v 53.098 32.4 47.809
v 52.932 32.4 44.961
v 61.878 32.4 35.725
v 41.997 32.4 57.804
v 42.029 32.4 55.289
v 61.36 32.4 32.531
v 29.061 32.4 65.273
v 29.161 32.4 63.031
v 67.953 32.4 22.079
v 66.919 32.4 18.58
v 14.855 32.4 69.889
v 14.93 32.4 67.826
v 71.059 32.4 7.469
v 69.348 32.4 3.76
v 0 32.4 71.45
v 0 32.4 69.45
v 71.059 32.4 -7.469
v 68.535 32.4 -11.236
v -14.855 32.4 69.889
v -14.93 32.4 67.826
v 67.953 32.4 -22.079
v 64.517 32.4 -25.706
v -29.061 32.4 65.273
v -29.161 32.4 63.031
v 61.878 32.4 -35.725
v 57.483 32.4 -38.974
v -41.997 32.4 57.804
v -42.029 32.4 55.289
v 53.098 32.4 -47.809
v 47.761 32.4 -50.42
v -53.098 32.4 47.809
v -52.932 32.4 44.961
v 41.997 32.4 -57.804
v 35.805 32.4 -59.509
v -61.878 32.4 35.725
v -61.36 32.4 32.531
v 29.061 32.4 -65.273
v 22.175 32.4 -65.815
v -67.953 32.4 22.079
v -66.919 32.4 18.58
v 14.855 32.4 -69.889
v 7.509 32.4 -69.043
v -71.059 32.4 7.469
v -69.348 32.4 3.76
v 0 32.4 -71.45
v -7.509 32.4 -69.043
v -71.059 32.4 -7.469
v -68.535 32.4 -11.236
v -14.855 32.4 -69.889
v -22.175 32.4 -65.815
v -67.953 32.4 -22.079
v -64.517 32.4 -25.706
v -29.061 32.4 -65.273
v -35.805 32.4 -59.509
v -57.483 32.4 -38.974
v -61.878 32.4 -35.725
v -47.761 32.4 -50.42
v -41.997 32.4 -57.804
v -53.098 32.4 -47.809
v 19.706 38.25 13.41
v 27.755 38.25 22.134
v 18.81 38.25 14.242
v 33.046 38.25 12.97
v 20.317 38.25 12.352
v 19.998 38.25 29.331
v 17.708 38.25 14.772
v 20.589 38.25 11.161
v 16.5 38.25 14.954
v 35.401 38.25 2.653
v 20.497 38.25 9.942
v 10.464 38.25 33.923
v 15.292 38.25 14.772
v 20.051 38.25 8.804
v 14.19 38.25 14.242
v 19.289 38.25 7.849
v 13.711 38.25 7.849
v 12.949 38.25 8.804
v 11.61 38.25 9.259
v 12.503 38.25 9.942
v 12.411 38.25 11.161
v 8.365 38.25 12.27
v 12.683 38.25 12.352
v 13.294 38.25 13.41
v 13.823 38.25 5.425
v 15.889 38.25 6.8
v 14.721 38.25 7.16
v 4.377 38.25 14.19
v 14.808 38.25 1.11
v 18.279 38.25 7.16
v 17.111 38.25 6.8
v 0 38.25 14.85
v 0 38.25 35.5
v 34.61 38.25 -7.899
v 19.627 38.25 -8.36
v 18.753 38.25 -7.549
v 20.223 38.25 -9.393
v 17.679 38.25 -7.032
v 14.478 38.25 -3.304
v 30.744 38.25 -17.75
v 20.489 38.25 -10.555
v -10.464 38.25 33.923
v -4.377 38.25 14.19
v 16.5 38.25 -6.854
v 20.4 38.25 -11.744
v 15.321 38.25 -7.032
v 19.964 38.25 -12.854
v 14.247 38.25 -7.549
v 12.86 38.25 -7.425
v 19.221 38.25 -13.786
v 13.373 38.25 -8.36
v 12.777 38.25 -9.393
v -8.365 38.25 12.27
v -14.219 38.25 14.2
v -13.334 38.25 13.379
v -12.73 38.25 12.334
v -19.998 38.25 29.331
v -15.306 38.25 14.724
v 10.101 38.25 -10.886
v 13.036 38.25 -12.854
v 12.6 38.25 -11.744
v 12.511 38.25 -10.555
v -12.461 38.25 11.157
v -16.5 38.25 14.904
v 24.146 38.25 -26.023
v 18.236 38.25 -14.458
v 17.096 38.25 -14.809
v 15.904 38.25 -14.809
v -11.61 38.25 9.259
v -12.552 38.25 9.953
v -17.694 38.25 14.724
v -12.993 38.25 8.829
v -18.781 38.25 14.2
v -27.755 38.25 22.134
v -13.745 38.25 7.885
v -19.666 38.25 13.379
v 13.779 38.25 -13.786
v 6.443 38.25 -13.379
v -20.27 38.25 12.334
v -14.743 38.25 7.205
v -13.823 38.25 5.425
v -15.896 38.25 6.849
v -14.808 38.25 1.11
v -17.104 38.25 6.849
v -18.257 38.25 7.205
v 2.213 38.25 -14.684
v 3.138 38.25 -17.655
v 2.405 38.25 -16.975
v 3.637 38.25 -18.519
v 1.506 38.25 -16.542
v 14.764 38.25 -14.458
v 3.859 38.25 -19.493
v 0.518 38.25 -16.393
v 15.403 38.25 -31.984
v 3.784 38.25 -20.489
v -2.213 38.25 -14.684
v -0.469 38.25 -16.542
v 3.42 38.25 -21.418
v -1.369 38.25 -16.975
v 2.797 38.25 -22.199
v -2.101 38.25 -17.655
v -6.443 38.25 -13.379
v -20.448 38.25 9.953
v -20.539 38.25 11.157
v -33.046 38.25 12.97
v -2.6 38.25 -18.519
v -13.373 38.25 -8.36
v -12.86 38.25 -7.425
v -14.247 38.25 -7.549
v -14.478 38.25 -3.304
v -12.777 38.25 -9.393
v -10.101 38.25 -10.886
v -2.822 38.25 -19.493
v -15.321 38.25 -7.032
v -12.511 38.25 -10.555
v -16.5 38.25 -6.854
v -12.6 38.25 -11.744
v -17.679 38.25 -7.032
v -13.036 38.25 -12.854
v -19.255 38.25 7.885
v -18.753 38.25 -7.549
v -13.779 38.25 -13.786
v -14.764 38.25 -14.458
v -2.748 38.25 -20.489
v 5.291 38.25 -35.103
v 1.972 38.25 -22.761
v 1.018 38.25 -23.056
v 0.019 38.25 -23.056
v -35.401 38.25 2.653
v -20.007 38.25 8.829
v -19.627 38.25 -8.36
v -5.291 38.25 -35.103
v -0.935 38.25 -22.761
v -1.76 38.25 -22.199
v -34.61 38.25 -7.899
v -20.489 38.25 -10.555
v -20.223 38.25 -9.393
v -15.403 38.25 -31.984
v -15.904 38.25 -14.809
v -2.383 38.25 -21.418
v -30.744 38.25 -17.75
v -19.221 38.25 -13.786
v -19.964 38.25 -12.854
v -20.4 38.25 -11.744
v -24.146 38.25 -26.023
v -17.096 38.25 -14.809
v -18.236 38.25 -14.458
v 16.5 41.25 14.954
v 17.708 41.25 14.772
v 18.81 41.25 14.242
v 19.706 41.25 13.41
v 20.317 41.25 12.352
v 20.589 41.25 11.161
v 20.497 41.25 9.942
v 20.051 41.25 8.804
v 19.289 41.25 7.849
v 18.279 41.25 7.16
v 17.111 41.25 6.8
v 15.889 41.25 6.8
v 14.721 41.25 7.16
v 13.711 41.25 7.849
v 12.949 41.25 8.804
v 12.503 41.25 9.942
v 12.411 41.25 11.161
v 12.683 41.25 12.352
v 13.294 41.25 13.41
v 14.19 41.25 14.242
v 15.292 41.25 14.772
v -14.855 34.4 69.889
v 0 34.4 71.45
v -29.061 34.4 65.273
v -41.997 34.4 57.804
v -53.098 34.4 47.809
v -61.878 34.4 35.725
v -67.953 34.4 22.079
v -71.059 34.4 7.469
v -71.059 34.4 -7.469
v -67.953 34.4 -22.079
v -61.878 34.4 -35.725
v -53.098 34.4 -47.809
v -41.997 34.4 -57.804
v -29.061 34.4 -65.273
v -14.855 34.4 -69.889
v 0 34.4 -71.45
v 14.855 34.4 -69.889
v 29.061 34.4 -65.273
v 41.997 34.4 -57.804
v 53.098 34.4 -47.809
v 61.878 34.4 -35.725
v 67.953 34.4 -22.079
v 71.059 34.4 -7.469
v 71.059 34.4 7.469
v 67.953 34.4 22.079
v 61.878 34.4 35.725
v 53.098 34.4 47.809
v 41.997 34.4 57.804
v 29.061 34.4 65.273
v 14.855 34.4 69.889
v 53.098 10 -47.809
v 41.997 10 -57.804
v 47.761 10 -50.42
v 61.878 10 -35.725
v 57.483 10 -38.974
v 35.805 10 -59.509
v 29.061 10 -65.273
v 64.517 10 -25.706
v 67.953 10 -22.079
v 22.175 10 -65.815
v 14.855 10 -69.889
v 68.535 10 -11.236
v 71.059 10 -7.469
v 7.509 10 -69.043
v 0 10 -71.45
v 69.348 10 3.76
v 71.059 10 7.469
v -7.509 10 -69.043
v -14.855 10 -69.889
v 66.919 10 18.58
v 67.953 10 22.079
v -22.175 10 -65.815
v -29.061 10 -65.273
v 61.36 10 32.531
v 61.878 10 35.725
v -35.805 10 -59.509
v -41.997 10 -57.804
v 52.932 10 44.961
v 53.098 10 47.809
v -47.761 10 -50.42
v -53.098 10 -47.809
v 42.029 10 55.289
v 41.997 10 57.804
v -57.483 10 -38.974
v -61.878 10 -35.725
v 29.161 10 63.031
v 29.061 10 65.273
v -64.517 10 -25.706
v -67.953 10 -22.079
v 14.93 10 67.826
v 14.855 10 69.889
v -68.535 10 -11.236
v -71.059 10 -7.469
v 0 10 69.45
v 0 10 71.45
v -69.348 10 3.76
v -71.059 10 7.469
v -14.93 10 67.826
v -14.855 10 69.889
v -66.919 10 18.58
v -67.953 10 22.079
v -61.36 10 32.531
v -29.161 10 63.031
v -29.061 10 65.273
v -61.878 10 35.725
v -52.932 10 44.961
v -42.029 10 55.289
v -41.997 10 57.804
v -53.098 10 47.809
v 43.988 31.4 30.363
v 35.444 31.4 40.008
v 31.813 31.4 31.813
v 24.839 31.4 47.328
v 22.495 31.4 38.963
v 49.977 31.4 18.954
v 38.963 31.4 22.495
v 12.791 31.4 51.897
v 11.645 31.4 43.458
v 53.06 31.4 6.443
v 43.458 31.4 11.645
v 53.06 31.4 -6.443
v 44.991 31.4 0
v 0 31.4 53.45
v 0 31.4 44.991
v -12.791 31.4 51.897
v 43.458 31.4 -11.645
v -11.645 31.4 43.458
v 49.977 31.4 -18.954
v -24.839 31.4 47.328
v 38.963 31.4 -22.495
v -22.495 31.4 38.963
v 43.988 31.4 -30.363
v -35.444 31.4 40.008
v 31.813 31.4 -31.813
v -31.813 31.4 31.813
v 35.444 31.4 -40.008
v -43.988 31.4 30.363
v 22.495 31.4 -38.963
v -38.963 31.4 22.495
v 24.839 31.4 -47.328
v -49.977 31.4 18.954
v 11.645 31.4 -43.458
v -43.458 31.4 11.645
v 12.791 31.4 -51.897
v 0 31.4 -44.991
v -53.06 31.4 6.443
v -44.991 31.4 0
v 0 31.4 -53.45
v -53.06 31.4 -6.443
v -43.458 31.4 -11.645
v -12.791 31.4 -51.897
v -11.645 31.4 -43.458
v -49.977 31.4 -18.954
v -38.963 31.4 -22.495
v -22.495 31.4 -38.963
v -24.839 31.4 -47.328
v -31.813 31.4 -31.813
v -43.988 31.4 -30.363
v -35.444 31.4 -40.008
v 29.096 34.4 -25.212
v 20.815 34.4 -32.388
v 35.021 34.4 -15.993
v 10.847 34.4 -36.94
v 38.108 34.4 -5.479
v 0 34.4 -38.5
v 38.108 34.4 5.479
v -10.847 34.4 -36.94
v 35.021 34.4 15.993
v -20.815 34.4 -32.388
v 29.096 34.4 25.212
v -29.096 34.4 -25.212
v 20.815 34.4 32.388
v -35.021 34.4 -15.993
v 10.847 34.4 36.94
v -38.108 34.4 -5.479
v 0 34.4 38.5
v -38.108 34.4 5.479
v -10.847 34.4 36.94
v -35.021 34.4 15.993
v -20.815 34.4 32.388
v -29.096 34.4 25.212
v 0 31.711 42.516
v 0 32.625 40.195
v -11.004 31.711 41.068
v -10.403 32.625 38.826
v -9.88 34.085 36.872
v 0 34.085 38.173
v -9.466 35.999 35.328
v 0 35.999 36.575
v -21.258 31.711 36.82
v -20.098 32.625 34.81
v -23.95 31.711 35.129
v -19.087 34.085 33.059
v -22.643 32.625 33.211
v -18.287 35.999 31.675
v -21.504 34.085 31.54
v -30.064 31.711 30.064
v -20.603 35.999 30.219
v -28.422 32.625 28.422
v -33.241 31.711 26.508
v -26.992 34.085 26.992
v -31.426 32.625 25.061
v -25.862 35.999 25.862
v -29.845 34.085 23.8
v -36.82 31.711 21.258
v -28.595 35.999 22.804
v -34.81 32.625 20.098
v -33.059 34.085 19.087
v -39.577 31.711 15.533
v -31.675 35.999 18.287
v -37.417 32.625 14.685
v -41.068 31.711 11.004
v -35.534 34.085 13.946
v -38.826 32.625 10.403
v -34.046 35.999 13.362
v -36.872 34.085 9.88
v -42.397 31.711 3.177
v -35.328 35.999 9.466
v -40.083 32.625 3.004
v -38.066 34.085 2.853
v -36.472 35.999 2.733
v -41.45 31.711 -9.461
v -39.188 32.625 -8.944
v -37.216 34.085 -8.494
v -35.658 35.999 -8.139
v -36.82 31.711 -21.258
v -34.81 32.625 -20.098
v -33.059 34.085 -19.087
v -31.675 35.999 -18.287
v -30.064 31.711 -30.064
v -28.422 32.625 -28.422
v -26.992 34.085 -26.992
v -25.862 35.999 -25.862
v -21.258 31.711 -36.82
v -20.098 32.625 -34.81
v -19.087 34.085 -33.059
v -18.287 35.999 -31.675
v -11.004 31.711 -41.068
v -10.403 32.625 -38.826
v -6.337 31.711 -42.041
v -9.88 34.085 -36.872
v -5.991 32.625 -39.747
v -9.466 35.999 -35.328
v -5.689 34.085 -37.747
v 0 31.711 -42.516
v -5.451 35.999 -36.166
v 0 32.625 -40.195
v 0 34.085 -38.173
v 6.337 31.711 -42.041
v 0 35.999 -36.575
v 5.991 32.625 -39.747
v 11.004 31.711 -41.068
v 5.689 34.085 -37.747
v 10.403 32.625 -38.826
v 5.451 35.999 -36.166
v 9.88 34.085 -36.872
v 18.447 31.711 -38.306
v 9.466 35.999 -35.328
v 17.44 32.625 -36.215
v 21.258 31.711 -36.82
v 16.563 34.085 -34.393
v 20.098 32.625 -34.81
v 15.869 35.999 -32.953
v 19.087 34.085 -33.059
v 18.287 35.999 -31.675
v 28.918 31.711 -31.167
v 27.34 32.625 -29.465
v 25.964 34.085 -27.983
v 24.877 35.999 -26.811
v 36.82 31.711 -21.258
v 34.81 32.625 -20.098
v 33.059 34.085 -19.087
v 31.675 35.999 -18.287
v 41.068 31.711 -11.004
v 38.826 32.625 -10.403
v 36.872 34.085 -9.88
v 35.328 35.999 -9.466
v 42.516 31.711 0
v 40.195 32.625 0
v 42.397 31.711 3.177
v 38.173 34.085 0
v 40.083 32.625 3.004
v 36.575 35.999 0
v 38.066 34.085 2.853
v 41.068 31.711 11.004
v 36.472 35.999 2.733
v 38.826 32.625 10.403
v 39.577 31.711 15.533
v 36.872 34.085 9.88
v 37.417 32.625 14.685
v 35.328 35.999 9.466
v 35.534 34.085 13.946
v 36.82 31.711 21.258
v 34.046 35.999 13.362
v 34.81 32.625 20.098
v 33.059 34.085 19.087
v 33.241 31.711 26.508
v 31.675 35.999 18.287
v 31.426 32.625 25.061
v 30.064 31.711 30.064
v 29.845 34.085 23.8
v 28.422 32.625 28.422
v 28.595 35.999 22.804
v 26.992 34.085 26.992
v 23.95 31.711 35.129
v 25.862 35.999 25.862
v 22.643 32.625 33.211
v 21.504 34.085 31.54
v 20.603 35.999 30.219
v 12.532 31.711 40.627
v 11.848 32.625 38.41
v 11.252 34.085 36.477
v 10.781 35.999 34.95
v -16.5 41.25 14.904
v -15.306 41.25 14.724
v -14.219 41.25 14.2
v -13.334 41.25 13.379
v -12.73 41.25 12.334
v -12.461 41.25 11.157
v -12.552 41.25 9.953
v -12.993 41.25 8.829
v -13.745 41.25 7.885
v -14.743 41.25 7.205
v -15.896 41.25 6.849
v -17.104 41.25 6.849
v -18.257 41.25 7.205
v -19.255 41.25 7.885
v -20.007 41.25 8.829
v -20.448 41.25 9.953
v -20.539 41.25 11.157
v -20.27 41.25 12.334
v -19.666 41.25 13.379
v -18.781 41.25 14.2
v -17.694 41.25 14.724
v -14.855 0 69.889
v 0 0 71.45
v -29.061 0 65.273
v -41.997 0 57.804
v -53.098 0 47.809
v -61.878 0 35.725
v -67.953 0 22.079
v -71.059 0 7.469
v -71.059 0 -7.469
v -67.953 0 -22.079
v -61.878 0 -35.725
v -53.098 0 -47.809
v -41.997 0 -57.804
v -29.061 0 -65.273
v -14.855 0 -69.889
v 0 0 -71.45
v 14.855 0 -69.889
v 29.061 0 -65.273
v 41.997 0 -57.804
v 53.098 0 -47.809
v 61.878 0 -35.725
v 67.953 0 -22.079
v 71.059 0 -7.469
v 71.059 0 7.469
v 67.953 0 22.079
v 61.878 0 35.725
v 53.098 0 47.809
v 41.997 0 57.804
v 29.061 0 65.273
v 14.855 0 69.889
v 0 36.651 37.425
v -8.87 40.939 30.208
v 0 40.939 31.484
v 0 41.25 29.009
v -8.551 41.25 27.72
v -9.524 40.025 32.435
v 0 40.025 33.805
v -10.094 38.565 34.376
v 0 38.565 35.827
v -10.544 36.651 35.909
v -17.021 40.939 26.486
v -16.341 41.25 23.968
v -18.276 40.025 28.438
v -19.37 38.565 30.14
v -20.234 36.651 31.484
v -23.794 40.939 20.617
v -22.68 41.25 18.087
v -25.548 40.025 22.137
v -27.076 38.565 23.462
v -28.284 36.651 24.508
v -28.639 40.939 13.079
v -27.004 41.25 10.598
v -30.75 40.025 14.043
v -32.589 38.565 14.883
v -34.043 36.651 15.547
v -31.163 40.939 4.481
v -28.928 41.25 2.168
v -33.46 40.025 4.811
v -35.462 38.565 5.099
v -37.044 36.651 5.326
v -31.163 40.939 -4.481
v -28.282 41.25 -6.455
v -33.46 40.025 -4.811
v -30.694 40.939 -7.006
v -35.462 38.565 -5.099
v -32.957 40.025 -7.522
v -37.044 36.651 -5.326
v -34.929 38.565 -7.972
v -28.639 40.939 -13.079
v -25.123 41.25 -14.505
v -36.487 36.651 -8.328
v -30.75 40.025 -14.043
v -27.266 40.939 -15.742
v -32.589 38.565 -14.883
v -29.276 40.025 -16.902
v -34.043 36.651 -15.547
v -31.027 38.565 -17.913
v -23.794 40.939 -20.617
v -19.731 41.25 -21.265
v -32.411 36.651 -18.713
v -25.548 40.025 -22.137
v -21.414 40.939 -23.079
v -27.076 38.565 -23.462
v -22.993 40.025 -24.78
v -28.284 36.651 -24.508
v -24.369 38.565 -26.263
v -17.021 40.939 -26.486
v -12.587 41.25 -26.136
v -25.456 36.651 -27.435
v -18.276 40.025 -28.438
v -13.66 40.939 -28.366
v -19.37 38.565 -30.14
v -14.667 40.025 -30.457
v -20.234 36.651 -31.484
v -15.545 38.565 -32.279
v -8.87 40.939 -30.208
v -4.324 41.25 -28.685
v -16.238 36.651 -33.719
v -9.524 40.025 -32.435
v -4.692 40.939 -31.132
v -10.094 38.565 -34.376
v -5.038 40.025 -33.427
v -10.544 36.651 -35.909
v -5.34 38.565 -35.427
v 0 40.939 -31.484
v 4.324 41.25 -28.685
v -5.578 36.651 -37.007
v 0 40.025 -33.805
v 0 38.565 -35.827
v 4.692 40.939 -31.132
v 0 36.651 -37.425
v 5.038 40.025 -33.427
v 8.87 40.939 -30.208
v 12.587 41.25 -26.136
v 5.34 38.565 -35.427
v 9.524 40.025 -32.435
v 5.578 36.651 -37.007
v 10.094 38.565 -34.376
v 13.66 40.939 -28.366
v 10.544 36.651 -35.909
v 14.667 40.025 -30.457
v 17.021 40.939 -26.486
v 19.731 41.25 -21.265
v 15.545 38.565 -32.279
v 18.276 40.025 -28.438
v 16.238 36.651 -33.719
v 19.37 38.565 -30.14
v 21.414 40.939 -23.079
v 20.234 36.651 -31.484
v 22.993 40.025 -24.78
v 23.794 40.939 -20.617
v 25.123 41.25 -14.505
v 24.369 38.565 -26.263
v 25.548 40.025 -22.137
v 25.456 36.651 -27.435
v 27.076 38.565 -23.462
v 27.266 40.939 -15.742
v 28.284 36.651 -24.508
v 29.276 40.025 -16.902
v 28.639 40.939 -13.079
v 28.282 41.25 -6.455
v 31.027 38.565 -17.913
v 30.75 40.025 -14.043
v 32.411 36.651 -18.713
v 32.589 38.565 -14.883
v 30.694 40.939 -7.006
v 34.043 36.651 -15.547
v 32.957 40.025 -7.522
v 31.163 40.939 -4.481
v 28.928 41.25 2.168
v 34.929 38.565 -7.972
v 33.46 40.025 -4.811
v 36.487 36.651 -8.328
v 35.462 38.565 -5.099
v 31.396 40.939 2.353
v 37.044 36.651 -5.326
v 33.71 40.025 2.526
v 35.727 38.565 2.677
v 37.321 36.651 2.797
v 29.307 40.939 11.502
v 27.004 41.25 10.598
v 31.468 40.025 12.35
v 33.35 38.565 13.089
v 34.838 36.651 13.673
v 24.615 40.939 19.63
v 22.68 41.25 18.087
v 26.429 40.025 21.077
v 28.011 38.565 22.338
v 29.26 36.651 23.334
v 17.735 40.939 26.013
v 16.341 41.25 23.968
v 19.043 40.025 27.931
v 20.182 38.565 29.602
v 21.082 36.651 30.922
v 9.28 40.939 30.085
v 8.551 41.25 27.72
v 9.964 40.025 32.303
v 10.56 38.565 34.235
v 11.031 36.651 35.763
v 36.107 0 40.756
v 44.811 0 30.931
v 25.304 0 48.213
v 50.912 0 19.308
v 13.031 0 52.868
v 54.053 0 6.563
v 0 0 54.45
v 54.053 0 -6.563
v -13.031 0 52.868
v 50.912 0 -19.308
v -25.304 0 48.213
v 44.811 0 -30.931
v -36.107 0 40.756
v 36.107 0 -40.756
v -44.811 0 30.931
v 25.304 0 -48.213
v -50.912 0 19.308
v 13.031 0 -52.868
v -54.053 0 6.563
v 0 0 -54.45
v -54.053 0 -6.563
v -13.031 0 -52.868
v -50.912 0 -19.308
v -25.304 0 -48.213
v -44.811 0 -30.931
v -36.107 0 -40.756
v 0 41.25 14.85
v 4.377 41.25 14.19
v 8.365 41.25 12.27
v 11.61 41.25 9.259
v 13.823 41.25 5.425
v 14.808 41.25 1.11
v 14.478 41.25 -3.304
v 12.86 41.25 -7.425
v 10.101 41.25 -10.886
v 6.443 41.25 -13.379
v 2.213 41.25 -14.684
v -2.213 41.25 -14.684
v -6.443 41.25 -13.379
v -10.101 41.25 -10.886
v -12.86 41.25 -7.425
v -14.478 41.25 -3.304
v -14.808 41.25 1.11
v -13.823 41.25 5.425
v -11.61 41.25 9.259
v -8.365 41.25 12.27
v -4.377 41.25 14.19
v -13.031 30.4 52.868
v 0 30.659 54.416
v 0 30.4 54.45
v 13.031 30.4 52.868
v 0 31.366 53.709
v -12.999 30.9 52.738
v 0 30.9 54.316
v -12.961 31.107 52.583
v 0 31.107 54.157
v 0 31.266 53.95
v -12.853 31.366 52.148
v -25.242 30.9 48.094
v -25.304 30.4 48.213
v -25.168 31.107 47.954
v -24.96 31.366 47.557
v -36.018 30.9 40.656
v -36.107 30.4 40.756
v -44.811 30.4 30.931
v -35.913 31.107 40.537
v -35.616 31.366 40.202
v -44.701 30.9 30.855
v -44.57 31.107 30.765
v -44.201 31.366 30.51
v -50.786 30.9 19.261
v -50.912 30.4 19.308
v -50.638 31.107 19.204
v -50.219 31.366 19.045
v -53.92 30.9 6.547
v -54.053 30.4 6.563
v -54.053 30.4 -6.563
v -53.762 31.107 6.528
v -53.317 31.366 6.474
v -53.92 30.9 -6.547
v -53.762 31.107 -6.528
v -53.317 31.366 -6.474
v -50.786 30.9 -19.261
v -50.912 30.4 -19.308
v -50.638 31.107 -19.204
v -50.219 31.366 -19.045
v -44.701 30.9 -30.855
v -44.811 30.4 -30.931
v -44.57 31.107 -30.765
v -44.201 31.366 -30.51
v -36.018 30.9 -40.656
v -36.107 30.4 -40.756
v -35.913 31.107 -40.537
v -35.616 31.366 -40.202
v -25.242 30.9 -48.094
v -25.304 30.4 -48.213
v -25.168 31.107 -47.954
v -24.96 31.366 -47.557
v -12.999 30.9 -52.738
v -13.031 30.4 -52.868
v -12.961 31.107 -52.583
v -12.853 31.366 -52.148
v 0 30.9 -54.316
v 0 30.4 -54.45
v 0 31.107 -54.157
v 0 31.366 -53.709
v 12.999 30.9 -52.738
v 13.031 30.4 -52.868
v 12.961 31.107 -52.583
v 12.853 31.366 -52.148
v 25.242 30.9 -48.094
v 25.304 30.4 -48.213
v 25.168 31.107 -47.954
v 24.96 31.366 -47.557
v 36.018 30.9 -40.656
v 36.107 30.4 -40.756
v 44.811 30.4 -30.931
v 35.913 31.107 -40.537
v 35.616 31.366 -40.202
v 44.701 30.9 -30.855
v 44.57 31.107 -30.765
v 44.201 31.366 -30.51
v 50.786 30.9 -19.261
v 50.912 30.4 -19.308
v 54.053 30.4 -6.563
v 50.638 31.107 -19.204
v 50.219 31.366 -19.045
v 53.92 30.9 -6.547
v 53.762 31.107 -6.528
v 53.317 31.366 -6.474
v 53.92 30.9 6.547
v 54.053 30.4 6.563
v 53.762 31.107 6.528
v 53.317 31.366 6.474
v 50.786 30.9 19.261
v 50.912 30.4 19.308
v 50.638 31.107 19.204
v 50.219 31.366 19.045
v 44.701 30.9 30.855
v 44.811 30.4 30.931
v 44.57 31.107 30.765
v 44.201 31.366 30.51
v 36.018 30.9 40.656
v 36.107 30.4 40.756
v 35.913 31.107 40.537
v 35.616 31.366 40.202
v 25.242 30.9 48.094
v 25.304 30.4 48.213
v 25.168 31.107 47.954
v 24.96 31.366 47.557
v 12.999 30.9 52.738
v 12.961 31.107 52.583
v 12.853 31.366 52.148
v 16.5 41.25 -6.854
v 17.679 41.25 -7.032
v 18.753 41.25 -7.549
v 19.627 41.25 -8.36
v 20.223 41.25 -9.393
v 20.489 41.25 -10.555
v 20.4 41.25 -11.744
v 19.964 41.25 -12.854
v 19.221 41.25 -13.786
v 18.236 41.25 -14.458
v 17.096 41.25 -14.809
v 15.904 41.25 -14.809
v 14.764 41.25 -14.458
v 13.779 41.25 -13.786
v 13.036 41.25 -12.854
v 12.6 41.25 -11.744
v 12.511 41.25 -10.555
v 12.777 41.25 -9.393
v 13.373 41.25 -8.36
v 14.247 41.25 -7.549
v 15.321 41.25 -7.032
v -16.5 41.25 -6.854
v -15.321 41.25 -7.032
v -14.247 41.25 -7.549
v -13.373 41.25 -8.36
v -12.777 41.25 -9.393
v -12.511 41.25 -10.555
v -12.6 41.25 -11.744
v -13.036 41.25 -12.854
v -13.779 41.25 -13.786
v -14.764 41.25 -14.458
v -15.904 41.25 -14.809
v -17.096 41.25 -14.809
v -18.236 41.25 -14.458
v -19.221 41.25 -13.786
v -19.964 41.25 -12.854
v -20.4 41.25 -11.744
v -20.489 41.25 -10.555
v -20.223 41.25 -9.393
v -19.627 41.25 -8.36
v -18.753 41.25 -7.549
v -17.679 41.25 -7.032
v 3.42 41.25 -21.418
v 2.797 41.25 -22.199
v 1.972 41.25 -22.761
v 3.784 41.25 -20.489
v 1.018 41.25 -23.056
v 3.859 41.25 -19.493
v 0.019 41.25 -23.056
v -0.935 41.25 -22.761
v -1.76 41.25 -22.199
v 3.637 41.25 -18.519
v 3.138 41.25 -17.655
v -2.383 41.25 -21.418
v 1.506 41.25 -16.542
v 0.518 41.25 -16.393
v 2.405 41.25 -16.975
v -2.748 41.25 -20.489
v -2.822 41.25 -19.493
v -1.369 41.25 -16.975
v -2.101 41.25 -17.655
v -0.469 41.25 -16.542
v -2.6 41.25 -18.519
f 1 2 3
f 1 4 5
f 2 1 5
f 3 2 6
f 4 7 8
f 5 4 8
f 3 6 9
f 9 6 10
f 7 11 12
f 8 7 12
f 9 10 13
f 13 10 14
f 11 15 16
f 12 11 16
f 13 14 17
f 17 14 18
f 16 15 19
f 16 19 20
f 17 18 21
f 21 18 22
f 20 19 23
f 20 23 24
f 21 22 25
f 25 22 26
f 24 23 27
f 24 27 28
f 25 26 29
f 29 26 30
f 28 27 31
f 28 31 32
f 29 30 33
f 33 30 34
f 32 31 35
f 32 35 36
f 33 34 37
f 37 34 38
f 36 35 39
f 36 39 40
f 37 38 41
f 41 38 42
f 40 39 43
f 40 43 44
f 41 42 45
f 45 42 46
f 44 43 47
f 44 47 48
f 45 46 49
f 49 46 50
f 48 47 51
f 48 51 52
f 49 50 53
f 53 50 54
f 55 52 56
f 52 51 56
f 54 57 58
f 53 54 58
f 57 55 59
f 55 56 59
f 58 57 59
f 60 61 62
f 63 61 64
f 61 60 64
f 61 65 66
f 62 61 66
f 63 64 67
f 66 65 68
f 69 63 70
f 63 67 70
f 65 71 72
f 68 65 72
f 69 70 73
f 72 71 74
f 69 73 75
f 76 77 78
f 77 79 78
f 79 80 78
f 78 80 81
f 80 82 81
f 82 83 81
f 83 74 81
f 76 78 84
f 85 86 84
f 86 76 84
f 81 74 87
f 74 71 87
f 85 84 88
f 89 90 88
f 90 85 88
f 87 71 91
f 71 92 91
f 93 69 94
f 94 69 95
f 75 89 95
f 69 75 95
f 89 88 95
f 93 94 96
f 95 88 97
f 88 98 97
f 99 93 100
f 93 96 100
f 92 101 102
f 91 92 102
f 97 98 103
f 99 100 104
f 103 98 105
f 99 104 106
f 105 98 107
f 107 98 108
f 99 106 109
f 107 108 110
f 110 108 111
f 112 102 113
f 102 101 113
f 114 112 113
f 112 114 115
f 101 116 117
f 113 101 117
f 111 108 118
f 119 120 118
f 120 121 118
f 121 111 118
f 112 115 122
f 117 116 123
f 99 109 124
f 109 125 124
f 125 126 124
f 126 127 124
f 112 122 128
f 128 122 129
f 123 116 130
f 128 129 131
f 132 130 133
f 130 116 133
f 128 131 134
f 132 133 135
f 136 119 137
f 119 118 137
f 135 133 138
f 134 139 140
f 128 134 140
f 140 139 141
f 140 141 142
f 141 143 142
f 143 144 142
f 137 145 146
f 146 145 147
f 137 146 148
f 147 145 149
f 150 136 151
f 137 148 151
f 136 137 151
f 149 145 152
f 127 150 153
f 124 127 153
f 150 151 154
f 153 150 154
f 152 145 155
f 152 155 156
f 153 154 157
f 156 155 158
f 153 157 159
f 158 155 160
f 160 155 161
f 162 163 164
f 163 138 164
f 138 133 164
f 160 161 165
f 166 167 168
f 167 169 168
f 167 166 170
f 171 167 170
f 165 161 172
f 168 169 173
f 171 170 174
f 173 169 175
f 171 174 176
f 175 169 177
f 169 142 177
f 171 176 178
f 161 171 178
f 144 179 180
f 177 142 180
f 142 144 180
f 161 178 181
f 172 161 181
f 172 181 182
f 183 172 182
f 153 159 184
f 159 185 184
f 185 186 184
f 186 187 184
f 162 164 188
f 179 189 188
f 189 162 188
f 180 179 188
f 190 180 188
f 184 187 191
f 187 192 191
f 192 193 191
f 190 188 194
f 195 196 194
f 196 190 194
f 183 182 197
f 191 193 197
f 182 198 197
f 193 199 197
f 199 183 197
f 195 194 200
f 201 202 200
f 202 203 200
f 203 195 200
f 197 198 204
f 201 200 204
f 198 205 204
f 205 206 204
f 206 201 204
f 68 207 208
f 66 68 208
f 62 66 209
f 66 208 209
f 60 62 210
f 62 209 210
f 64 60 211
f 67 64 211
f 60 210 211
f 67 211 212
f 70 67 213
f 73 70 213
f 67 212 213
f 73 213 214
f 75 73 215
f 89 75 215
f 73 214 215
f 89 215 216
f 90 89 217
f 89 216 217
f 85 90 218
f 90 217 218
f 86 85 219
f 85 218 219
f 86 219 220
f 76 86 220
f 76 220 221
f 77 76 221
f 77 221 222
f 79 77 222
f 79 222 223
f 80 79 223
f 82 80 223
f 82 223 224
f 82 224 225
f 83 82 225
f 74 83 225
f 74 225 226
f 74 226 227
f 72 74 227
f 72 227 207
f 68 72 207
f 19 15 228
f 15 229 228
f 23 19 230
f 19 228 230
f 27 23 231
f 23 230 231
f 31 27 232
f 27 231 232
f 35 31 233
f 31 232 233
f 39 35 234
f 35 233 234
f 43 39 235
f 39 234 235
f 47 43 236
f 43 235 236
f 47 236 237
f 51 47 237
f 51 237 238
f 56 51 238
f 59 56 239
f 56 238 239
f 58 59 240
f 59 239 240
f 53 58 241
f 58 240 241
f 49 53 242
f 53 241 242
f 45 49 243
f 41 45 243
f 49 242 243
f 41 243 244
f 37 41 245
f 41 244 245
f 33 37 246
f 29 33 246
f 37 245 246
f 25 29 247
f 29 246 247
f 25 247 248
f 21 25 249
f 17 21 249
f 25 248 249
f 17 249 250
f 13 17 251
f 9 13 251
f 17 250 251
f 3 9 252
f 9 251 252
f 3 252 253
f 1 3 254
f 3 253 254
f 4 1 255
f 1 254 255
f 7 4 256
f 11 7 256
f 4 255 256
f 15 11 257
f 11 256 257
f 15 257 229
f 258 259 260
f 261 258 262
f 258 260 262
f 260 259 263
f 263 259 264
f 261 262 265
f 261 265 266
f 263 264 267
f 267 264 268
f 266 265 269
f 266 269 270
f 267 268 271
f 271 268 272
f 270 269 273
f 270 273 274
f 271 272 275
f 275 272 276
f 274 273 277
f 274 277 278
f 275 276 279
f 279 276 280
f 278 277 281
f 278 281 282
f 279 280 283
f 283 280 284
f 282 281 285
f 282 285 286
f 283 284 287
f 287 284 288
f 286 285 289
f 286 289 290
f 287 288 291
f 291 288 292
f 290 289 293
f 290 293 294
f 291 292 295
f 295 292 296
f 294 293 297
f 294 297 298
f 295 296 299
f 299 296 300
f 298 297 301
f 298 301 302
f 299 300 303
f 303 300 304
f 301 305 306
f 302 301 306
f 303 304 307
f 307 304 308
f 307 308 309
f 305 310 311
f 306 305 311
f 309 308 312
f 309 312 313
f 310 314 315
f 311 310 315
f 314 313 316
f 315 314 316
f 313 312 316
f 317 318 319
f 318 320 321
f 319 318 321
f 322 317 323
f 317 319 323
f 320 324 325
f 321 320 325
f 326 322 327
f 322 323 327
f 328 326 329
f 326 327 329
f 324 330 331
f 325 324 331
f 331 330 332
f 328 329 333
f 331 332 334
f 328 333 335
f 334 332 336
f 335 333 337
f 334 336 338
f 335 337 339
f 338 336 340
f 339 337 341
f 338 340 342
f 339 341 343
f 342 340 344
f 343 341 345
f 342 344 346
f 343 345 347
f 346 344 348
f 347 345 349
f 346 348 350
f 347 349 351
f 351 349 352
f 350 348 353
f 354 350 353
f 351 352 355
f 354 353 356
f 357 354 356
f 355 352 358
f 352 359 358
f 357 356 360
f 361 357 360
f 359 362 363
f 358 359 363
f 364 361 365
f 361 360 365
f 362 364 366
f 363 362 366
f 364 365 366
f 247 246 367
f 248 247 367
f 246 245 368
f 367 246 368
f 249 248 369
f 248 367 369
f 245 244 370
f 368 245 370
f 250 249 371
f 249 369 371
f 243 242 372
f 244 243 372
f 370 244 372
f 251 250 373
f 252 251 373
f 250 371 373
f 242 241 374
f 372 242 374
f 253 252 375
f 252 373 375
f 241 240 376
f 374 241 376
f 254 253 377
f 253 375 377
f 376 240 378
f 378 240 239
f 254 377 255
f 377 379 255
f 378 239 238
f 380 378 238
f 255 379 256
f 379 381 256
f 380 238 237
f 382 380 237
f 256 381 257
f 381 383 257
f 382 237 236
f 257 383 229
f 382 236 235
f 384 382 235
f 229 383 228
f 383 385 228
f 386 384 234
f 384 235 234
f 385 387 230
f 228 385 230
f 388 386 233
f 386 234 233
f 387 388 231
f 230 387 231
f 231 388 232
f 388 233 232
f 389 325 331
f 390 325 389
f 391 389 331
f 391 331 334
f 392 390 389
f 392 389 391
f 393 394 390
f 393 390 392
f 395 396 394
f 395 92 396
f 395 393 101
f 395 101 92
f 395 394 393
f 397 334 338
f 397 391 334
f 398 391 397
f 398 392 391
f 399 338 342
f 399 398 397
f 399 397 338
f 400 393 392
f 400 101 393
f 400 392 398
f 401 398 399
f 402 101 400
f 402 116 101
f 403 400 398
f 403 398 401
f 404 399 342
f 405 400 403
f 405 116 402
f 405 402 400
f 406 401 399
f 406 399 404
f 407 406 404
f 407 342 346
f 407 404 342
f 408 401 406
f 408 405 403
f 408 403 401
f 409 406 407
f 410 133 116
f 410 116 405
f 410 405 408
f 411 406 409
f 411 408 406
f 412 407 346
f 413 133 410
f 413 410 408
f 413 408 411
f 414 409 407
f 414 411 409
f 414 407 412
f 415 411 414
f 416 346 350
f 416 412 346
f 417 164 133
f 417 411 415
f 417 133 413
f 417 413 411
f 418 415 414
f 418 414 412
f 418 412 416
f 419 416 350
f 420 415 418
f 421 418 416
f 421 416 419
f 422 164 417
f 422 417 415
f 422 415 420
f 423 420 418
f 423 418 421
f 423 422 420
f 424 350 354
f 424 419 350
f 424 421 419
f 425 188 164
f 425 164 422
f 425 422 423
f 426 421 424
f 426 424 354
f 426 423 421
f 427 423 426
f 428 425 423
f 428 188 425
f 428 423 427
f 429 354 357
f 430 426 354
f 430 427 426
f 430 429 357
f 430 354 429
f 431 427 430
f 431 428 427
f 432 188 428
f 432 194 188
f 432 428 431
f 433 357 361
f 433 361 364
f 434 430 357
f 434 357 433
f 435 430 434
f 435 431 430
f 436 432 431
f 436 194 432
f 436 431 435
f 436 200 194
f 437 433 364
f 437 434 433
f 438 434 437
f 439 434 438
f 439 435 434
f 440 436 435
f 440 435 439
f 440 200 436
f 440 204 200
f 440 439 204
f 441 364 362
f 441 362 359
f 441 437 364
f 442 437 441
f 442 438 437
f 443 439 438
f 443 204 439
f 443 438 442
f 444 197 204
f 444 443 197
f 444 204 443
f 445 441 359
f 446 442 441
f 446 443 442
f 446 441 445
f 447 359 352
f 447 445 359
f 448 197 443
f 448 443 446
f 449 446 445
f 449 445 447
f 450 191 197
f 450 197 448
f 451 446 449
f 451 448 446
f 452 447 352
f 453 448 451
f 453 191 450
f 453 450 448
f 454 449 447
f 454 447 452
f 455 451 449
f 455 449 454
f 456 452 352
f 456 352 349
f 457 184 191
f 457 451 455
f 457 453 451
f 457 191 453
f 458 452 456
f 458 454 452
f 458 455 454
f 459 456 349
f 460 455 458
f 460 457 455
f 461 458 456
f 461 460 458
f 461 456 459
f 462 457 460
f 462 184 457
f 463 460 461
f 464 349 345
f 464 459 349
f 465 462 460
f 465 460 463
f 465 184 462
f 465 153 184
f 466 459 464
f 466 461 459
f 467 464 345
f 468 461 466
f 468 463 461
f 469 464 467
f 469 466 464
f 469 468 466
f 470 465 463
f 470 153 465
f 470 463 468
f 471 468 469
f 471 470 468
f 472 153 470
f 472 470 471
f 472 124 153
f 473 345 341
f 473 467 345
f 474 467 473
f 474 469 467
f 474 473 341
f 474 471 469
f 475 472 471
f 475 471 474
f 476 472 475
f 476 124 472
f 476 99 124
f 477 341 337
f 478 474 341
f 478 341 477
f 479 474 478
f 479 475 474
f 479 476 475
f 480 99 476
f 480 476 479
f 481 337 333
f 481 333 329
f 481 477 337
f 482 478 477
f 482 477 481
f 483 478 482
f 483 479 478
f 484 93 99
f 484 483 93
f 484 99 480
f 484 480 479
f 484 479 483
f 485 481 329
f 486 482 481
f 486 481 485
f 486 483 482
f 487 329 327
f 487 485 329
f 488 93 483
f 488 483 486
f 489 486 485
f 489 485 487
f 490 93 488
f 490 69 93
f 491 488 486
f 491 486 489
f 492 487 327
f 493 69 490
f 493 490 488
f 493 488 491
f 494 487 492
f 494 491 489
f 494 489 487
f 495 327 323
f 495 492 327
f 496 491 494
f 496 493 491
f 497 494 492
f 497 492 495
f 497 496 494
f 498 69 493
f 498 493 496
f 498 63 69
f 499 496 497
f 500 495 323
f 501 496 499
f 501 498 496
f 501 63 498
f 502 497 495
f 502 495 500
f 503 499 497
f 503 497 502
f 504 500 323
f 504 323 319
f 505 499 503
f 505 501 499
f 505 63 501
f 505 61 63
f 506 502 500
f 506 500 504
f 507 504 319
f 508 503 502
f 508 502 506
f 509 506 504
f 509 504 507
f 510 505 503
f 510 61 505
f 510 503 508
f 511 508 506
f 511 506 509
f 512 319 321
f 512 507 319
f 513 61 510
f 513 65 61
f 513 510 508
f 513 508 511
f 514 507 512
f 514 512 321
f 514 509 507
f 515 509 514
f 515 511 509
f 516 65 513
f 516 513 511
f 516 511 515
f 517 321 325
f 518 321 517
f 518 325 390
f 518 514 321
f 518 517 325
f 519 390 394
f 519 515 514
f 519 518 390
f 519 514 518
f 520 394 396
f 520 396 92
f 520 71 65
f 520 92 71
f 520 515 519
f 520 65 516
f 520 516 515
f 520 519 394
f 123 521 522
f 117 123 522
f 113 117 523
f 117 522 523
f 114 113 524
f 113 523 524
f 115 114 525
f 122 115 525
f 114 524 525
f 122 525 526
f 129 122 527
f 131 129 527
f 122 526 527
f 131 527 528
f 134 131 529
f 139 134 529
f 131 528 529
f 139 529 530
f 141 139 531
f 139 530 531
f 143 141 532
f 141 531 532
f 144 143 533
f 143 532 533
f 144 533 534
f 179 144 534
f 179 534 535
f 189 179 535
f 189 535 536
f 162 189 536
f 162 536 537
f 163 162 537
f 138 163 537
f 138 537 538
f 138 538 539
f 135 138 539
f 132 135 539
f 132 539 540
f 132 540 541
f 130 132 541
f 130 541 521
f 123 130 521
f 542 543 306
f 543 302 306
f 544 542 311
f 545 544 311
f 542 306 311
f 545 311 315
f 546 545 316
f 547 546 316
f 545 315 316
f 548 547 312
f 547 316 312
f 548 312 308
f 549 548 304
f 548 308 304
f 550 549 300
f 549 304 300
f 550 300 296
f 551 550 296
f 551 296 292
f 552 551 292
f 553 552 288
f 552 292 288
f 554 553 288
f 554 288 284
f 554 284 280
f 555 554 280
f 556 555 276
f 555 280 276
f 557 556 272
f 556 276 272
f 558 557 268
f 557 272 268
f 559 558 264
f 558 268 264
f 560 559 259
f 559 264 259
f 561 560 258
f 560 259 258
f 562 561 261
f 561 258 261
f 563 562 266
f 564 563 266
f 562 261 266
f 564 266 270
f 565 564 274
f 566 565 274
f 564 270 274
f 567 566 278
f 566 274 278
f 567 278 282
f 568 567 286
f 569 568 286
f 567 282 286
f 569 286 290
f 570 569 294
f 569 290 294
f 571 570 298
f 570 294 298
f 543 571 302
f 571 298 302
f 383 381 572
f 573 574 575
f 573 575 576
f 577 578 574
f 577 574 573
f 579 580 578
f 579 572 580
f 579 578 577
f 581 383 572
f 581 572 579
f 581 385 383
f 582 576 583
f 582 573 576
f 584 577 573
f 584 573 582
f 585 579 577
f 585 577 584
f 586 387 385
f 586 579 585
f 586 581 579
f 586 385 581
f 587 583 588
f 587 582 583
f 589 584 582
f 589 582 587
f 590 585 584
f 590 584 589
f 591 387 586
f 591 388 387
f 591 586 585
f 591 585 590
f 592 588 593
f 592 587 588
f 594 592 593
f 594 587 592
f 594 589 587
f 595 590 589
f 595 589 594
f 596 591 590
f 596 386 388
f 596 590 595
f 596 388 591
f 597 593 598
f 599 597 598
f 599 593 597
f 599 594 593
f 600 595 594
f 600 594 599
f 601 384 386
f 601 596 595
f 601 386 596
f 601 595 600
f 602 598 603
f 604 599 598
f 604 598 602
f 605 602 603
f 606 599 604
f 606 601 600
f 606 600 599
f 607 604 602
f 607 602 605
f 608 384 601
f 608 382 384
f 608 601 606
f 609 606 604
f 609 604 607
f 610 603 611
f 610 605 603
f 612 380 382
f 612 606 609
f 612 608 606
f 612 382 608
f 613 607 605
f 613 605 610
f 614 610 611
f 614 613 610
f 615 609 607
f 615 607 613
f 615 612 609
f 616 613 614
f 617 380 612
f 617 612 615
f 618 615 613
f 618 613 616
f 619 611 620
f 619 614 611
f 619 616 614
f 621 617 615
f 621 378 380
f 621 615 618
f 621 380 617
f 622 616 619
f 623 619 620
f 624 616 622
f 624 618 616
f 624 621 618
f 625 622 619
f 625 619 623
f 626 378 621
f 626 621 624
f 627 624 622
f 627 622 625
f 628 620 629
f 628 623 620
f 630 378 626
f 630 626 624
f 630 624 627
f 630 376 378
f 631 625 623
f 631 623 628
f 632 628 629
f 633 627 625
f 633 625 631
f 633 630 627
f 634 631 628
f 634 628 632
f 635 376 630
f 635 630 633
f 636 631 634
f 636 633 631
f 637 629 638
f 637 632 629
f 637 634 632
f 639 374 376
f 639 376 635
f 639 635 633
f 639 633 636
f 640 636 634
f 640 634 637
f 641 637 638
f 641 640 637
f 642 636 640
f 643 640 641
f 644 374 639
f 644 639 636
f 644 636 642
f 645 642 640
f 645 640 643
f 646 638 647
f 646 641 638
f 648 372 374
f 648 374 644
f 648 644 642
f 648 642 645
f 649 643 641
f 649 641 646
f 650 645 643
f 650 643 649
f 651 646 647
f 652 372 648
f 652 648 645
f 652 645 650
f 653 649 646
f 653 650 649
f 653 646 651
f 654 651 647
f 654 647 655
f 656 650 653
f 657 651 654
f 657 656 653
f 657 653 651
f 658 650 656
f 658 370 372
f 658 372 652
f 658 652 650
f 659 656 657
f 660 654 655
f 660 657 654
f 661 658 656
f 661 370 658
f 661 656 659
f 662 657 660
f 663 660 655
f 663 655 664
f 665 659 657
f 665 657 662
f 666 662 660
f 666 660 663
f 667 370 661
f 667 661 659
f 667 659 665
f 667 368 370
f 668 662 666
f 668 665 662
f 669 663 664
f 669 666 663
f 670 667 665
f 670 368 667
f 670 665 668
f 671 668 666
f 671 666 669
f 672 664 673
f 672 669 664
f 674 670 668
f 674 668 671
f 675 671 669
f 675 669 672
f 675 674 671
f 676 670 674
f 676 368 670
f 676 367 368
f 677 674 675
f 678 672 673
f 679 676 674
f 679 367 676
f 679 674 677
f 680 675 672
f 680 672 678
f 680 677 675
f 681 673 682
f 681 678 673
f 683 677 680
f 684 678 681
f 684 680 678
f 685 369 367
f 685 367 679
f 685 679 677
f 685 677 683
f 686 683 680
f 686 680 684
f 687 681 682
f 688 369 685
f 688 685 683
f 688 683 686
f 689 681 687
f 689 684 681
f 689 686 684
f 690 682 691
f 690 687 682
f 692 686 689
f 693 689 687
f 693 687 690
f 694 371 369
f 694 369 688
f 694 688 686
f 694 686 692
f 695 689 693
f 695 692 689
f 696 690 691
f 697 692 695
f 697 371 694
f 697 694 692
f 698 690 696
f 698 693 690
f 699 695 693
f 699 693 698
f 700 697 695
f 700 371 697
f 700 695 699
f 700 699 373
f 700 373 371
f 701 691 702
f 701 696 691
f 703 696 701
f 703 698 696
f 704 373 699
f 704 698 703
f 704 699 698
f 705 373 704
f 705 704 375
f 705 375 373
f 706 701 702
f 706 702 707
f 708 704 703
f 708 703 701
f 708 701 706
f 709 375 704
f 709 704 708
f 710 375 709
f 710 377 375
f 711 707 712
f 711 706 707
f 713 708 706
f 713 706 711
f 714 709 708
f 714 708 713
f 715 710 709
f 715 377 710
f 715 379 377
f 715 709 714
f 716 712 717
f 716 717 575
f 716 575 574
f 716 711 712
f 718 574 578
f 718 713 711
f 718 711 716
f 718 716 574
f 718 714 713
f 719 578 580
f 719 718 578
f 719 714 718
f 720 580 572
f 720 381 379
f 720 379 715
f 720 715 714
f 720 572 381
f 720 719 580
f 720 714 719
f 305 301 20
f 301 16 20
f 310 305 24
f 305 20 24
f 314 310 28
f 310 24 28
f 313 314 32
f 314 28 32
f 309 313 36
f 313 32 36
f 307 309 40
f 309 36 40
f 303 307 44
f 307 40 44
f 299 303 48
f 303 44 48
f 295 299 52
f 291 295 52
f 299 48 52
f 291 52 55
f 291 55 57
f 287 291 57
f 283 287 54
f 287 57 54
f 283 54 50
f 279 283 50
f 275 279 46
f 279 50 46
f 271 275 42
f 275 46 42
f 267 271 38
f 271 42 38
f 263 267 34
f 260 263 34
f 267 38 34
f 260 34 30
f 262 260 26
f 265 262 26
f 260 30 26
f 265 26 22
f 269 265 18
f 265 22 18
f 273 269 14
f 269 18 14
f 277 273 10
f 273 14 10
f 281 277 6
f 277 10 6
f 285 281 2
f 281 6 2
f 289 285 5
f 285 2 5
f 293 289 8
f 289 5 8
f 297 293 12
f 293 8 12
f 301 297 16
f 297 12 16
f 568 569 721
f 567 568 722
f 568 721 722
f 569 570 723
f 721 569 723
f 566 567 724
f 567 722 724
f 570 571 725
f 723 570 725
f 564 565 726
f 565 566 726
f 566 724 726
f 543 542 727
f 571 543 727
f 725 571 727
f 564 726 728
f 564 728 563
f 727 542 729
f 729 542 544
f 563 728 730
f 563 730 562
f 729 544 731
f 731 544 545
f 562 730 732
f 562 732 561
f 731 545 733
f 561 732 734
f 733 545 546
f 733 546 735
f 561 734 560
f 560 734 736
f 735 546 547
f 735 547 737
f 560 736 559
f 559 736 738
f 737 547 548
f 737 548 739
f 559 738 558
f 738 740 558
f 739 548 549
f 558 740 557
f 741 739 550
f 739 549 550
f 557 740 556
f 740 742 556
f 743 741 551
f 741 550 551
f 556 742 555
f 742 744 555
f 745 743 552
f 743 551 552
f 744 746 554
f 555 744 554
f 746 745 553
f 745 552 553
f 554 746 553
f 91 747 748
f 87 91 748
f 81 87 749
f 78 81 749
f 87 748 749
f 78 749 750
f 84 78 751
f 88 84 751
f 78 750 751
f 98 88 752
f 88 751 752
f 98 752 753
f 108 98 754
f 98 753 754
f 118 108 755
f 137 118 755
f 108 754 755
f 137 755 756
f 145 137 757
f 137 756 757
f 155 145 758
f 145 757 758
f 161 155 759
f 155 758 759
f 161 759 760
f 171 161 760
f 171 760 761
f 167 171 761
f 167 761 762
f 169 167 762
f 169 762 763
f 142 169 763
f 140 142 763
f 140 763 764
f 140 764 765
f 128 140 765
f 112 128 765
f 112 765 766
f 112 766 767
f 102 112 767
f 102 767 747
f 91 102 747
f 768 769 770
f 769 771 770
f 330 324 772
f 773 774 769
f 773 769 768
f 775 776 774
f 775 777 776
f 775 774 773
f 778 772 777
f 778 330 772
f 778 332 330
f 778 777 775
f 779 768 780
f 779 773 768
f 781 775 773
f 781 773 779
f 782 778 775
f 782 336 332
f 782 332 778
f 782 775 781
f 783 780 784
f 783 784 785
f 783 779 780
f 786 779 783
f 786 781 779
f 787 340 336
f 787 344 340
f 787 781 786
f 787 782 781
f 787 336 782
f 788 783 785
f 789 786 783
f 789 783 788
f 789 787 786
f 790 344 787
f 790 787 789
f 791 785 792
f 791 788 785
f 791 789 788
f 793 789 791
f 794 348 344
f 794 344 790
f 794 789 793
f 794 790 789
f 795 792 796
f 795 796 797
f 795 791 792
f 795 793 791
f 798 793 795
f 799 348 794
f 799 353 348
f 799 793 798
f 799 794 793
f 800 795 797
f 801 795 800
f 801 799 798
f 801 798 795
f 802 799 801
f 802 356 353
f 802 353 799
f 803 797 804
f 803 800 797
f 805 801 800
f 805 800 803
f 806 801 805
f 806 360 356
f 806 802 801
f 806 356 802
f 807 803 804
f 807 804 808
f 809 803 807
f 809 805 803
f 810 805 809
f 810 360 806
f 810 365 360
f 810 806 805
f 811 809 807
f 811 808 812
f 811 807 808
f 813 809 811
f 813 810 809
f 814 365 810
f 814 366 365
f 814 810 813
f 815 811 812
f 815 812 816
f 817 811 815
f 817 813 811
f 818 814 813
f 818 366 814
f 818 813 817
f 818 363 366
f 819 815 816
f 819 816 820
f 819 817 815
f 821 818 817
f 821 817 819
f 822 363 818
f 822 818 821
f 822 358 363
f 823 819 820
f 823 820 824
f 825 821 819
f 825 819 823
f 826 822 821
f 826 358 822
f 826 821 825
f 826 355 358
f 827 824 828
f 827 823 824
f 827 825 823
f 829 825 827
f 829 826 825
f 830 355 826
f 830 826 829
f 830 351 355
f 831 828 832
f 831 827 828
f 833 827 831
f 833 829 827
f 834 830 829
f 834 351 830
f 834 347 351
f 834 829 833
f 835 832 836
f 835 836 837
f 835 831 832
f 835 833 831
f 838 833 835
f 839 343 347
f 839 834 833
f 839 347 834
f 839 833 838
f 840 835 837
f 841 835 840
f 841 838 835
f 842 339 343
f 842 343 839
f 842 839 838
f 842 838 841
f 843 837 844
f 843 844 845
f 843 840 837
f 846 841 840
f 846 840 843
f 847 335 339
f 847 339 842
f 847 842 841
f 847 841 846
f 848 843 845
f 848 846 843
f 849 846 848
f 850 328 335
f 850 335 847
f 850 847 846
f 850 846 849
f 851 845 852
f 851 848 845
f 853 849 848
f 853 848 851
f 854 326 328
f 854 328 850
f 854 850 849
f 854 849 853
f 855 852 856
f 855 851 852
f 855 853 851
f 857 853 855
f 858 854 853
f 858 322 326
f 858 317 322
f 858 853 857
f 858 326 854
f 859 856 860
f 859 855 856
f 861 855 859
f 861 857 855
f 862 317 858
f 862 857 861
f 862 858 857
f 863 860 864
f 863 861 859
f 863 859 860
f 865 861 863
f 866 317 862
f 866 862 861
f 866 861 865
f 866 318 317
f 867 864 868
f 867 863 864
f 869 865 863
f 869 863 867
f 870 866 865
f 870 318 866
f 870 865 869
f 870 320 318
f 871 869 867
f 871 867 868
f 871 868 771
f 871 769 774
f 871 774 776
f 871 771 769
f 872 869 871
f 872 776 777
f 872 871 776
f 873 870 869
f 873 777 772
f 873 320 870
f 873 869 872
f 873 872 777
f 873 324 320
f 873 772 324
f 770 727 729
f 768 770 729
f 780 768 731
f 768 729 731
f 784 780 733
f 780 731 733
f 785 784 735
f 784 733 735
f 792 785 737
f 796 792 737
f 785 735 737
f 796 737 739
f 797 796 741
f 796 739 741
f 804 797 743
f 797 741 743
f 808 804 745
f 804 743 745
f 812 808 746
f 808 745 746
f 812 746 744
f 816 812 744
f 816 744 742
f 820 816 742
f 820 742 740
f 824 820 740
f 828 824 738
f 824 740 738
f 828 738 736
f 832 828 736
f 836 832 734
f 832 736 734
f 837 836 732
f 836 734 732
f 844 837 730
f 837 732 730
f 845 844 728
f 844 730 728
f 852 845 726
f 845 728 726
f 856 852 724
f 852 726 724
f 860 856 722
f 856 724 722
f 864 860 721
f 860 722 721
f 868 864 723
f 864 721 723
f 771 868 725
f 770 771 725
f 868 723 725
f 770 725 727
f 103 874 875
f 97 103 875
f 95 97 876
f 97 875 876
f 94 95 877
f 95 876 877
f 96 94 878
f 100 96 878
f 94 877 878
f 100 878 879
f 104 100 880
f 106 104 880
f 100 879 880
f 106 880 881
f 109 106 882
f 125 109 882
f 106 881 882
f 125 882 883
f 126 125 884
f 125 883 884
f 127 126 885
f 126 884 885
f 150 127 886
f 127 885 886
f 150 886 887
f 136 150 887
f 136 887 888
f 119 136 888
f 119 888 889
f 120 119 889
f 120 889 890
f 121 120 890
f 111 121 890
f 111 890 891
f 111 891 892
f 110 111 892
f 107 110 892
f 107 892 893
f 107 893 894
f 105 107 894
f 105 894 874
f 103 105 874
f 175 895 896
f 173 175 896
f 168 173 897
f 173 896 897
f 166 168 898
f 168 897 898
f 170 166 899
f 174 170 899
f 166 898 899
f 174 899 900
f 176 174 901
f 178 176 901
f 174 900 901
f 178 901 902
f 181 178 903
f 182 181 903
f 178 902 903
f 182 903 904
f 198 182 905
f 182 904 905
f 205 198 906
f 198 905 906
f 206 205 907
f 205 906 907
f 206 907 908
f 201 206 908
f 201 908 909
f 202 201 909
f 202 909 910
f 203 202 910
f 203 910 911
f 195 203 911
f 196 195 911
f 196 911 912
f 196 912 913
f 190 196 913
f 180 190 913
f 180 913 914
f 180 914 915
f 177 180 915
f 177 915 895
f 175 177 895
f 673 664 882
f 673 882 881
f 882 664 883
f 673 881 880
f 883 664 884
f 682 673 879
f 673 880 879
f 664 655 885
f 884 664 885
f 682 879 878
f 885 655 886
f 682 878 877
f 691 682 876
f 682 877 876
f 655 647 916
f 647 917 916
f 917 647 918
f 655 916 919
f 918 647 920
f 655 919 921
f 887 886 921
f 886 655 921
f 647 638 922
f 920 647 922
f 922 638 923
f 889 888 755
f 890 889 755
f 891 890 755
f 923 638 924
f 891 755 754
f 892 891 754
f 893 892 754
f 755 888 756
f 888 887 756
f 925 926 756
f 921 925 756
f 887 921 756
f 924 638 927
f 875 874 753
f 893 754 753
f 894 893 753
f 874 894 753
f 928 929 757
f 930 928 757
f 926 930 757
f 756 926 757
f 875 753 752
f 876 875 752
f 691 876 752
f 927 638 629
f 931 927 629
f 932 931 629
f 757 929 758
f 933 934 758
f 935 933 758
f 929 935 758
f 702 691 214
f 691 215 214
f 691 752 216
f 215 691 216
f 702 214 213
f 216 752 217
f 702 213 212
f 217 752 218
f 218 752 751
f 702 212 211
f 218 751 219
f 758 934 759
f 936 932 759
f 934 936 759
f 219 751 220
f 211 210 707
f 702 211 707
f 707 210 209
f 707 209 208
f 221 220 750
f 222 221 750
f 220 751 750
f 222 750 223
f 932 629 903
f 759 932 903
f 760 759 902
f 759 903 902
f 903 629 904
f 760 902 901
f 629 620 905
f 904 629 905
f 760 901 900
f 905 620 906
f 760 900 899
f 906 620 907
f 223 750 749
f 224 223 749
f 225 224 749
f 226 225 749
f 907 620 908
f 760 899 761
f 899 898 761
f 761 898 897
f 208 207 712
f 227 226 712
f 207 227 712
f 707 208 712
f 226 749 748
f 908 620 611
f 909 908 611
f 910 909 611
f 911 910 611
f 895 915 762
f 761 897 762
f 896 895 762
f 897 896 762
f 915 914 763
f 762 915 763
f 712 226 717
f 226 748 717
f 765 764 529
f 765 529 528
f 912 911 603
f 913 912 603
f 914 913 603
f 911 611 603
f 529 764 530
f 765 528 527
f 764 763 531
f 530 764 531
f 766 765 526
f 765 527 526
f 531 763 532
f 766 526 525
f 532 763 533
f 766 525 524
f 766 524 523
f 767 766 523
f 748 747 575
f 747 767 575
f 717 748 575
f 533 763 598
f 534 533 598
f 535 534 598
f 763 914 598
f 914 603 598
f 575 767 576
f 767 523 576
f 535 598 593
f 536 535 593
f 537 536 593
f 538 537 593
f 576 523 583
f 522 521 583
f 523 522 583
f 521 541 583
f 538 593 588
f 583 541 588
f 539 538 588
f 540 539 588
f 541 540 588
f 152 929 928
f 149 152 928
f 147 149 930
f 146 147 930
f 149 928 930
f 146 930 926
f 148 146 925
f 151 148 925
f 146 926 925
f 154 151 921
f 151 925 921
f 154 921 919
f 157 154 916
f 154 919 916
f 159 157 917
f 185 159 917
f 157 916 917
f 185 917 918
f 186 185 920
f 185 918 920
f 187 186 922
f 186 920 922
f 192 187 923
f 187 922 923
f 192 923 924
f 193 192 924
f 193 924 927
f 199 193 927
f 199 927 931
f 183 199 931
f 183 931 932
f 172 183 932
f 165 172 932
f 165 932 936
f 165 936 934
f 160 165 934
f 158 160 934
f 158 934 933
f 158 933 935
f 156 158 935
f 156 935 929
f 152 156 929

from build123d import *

# Parameters (mm, degrees)
REDONDEO2_R           = 10
CROQUIS3_R            = 14.85
CORTAR_EXTRUIR1_DEPTH = 10
CROQUIS4_R            = 3.35
CROQUIS4_R_2          = 4
CROQUIS4_R_3          = 4.1
CROQUIS4_R_4          = 4.05
CORTAR_EXTRUIR2_DEPTH = 10
REDONDEO3_R           = 10
REDONDEO4_R           = 1


with BuildPart() as part:
    # Croquis2 → Revolución1 (revolve)
    with BuildSketch(Plane.XY, mode=Mode.PRIVATE) as revoluci_n1_sk:
        Polygon((54.45, 0), (71.45, 0), (71.45, 10), (69.45, 10), (69.45, 32.4), (71.45, 32.4), (71.45, 34.4), (38.5, 34.4), (38.5, 41.25), (0, 41.25), (0, 38.25), (35.5, 38.25), (35.5, 31.4), (54.45, 31.4), align=None)
    revolve(revoluci_n1_sk.sketch.rotate(Axis((0, 41.25, 0), (0, -1, 0)), 90), axis=Axis((0, 41.25, 0), (0, -1, 0)))

    # Redondeo2
    # the kernel refuses this fillet: 10 mm, written as the material it takes off along each edge
    with BuildSketch(Plane(origin=(0, 41.25, 0), x_dir=(0, 0, 1), z_dir=(1, 0, 0))) as redondeo2_piece_1:
        with BuildLine():
            CenterArc((29.00908329, 10), REDONDEO2_R, 270, 71.639186206)
            Line((29.00908329, 0), (29.00908329, -0.2))
            Line((29.00908329, -0.2), (38.5, -0.2))
            Line((38.5, -0.2), (38.7, 0))
            ThreePointArc((38.7, 0), (38.7, 3.425), (38.689818334, 6.787))
            Line((38.689818334, 6.787), (38.5, 6.85))
        make_face()
    revolve(axis=Axis((0, 41.25, 0), (0, -1, 0)), mode=Mode.SUBTRACT)

    # Croquis3 → Cortar-Extruir1 (cut)
    with BuildSketch(Plane(origin=(0, 41.25, 0), x_dir=(1, 0, 0), z_dir=(0, 1, 0))):
        with Locations(Location((0, 0, 0), (0, 0, 270))):
            Circle(CROQUIS3_R)
    extrude(amount=-CORTAR_EXTRUIR1_DEPTH, mode=Mode.SUBTRACT)

    # Croquis4 → Cortar-Extruir2 (cut)
    with BuildSketch(Plane(origin=(0, 41.25, 0), x_dir=(1, 0, 0), z_dir=(0, 1, 0))):
        with Locations(Location((0.518366506, 19.743196199, 0), (0, 0, 270))):
            Circle(CROQUIS4_R)
        with Locations(Location((-16.5, 10.854146673, 0), (0, 0, 270))):
            Circle(CROQUIS4_R_2)
        with Locations(Location((16.5, 10.854146673, 0), (0, 0, 270))):
            Circle(CROQUIS4_R_2)
        with Locations(Location((16.5, -10.854146673, 0), (0, 0, 270))):
            Circle(CROQUIS4_R_3)
        with Locations(Location((-16.5, -10.854146673, 0), (0, 0, 270))):
            Circle(CROQUIS4_R_4)
    extrude(amount=-CORTAR_EXTRUIR2_DEPTH, mode=Mode.SUBTRACT)

    # Redondeo3
    # the kernel refuses this fillet: 10 mm, written as the material it takes off along each edge
    with BuildSketch(Plane(origin=(0, 31.4, 0), x_dir=(0, 0, 1), z_dir=(1, 0, 0))) as redondeo3_piece_1:
        with BuildLine():
            CenterArc((44.99091671, -10), REDONDEO3_R, 90, 71.639186206)
            Line((35.5, -6.85), (35.310181666, -6.787))
            ThreePointArc((35.310181666, -6.787), (35.3, -3.425), (35.3, 0))
            Line((35.3, 0), (35.5, 0.2))
            Line((35.5, 0.2), (44.99091671, 0.2))
            Line((44.99091671, 0.2), (44.99091671, 0))
        make_face()
    revolve(axis=Axis((0, 31.4, 0), (0, -1, 0)), mode=Mode.SUBTRACT)

    # Redondeo4
    redondeo4_edges = [part.edges().sort_by_distance(p)[0] for p in [
        (0, 31.4, -54.45),
    ]]
    fillet(redondeo4_edges, radius=REDONDEO4_R)


solid = part.part
